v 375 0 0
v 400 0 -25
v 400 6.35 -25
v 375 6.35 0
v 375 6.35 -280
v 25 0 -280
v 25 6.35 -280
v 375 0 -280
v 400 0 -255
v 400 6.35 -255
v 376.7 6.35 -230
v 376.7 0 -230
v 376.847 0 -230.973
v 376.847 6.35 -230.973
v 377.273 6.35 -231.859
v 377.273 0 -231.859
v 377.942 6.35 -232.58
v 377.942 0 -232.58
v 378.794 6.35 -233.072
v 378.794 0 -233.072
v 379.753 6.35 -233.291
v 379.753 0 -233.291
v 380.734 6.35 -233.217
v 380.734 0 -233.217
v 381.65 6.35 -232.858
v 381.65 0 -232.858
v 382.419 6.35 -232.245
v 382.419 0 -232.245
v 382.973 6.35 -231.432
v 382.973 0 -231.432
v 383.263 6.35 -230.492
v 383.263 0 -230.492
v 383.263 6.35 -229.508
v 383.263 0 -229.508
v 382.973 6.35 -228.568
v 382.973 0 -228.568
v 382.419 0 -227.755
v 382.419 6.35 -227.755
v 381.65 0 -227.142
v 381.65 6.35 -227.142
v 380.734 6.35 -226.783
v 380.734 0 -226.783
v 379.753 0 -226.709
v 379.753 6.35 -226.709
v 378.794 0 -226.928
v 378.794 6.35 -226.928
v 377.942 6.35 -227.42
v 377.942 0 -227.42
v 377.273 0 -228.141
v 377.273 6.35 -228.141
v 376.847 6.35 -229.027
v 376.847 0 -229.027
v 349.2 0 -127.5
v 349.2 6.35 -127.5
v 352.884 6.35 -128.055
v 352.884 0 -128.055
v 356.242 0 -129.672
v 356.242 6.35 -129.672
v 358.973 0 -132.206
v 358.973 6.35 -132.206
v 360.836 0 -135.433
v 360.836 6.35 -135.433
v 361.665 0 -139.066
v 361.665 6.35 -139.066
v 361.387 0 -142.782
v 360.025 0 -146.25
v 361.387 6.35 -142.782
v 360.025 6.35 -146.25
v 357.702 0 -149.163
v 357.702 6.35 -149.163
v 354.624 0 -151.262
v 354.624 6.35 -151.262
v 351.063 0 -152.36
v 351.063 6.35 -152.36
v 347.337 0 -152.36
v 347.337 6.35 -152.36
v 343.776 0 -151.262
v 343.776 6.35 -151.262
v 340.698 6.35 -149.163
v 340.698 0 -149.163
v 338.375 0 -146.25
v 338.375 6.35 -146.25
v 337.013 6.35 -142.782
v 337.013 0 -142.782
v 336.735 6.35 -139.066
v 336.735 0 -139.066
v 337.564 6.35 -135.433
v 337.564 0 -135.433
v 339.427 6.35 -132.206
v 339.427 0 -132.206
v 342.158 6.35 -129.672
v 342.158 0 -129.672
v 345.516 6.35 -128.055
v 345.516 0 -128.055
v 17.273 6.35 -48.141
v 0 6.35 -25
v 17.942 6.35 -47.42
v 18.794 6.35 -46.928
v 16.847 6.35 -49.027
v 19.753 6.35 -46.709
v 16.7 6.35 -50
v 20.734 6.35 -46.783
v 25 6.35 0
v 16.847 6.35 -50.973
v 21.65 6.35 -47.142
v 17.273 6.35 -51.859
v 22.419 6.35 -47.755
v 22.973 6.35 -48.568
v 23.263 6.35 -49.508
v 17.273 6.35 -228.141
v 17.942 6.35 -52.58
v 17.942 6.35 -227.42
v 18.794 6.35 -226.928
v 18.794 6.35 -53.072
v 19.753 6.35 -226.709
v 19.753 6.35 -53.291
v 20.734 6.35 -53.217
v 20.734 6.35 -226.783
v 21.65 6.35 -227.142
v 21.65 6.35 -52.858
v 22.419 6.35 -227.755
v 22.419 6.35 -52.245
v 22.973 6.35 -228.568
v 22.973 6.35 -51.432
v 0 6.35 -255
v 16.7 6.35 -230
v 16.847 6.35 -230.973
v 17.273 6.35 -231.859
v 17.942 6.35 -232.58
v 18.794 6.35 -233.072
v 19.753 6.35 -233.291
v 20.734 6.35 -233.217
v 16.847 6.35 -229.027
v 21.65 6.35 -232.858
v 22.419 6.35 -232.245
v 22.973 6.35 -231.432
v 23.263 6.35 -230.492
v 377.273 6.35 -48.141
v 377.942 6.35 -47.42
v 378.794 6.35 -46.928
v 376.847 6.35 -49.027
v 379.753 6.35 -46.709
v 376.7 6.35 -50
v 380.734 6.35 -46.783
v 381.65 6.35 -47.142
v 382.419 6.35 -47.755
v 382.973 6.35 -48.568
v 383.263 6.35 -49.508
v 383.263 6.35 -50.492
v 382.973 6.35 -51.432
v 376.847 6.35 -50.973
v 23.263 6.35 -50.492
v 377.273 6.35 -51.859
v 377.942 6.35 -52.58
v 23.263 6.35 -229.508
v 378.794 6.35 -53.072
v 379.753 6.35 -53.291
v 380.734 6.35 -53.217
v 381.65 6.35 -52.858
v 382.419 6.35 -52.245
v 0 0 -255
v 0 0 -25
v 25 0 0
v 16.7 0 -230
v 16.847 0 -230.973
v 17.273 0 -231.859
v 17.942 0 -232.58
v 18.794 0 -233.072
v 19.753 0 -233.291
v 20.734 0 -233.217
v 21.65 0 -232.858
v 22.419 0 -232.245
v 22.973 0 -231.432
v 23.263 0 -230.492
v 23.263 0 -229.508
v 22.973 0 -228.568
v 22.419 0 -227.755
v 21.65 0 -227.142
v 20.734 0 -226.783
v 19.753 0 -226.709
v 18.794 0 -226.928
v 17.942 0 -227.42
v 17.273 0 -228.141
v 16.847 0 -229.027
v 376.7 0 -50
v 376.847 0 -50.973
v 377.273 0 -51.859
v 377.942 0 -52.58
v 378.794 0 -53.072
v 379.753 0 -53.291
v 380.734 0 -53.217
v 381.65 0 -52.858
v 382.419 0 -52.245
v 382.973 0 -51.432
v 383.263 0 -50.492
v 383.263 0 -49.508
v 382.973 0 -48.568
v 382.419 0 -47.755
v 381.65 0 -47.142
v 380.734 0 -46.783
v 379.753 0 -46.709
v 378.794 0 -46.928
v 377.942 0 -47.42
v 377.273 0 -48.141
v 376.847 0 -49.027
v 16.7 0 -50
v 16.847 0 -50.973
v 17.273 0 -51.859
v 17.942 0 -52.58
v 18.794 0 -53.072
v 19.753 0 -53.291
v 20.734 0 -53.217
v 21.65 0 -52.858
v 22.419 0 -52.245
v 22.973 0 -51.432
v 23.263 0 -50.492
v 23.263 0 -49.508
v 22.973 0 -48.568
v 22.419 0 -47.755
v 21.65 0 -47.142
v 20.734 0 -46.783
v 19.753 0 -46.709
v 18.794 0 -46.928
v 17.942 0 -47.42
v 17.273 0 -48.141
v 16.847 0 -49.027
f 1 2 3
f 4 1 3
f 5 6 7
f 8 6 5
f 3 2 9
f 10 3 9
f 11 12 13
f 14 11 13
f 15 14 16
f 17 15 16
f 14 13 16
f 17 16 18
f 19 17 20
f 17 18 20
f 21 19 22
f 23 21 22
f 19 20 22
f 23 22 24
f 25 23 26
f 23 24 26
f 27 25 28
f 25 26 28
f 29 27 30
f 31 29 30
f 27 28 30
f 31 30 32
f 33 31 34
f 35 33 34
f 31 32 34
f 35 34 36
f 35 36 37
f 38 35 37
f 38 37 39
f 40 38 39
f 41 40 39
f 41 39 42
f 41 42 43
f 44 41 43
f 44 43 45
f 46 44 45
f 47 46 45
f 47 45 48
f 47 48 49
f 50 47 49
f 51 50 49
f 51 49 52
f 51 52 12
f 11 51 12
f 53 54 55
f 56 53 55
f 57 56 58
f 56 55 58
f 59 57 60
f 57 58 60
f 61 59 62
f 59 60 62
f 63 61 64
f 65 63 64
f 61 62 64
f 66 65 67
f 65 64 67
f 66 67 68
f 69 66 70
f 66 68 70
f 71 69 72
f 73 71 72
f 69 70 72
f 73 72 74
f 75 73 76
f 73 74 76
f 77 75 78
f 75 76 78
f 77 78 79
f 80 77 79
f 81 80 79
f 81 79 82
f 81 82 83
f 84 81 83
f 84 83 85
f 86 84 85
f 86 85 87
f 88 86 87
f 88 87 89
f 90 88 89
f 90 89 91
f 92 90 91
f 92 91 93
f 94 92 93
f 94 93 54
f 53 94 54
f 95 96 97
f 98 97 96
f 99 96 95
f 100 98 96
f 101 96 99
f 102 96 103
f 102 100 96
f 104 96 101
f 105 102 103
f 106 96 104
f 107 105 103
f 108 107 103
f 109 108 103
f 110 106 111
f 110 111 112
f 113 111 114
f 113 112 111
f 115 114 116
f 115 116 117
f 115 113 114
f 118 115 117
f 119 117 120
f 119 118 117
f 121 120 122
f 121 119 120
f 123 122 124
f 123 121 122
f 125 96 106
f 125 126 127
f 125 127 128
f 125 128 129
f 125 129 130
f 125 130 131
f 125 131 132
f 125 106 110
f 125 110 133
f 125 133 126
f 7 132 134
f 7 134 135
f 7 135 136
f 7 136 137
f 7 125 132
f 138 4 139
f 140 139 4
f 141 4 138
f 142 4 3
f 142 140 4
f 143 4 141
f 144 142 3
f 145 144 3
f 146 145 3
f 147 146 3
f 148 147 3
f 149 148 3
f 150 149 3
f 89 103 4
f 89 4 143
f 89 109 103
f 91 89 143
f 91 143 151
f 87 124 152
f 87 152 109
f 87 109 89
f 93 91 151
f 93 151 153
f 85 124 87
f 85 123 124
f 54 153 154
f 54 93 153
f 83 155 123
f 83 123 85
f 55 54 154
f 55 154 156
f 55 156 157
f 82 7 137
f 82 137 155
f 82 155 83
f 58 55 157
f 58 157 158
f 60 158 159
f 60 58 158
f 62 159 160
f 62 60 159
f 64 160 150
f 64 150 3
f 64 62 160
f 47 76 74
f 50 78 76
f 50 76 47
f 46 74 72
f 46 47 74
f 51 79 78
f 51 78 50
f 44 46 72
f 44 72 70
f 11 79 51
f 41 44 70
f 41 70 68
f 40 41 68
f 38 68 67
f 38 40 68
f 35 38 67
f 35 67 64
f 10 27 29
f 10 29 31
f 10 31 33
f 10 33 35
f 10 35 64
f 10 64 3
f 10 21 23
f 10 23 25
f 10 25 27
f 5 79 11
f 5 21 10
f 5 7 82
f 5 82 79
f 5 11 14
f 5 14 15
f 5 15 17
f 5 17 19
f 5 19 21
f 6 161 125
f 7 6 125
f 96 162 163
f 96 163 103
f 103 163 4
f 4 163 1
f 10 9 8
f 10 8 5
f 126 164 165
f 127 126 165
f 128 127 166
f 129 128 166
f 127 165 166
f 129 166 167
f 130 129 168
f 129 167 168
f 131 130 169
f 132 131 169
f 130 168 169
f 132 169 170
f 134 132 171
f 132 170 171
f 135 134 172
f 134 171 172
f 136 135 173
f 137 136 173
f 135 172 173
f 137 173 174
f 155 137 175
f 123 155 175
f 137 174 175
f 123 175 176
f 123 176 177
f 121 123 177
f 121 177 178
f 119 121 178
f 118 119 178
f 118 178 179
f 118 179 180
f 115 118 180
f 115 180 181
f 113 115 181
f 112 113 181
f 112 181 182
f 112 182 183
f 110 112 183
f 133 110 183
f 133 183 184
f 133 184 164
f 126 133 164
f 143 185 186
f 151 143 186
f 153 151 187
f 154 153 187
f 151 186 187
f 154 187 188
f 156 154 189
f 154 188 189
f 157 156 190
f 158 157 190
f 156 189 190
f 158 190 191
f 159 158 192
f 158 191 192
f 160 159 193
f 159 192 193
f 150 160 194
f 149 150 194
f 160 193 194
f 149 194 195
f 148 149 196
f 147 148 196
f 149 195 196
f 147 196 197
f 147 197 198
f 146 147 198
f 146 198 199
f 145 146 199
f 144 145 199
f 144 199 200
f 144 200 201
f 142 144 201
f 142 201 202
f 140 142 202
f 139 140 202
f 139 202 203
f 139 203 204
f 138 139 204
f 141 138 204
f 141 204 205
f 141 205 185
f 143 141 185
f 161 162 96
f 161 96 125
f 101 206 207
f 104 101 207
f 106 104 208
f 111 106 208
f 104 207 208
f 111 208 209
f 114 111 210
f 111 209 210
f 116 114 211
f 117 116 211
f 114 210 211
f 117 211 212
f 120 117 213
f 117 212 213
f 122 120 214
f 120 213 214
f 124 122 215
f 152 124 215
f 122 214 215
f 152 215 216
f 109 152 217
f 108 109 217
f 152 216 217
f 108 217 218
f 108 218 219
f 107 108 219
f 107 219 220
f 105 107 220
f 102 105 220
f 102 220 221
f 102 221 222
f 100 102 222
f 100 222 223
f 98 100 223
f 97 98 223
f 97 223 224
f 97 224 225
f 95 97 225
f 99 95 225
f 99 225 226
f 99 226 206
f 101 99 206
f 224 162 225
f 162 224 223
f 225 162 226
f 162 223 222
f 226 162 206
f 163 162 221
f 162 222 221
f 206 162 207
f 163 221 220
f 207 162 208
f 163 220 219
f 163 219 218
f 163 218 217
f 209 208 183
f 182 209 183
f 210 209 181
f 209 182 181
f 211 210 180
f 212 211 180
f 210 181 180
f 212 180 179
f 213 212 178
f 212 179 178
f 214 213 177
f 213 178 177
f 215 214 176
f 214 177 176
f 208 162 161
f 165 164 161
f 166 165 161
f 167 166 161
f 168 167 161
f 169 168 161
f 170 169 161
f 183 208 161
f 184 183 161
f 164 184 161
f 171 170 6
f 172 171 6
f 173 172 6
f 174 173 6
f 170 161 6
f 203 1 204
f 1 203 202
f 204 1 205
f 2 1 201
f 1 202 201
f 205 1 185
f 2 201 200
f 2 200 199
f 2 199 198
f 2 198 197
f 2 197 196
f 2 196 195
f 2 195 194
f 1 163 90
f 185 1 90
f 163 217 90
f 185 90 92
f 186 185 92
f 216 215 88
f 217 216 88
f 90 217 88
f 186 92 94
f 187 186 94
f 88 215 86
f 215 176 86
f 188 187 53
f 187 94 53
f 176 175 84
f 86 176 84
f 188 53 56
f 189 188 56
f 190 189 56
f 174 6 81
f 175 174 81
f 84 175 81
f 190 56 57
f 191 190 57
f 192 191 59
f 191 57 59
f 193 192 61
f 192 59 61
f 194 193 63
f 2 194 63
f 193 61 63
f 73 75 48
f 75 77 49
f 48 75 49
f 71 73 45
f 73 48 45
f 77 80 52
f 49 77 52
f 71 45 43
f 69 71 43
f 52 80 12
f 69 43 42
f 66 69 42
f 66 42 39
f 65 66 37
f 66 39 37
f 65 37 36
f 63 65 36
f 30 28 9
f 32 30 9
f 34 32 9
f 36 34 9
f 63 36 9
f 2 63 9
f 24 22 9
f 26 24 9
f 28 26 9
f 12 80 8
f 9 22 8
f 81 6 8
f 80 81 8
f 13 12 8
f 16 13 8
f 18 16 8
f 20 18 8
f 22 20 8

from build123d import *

# Parameters (mm, degrees)
SKETCH1_W            = 400
SKETCH1_H            = 280
BOSS_EXTRUDE1_DEPTH  = 6.35
CHAMFER1_SIZE        = 25
SKETCH2_R            = 12.5
CUT_EXTRUDE1_DEPTH   = 489.303514732
M6_CLEARANCE_HOLE1_D = 6.6


with BuildPart() as part:
    # Sketch1 → Boss-Extrude1 (new body)
    with BuildSketch(Plane(origin=(0, 0, 0), x_dir=(1, 0, 0), z_dir=(0, 1, 0))):
        with Locations((200, 140)):
            Rectangle(SKETCH1_W, SKETCH1_H)
    extrude(amount=BOSS_EXTRUDE1_DEPTH)

    # Chamfer1
    chamfer1_edges = [part.edges().sort_by_distance(p)[0] for p in [
        (0, 3.175, -280),
        (400, 3.175, -280),
        (400, 3.175, 0),
        (0, 3.175, 0),
    ]]
    chamfer(chamfer1_edges, length=CHAMFER1_SIZE)

    # Sketch2 → Cut-Extrude1 (cut, through all)
    with BuildSketch(Plane(origin=(0, 6.35, 0), x_dir=(1, 0, 0), z_dir=(0, 1, 0))):
        with Locations(Location((349.2, 140, 0), (0, 0, 270))):
            Circle(SKETCH2_R)
    extrude(amount=-CUT_EXTRUDE1_DEPTH, mode=Mode.SUBTRACT)

    # M6 Clearance Hole1 (through all)
    with Locations(Plane(origin=(0, 6.35, 0), x_dir=(1, 0, 0), z_dir=(0, 1, 0))):
        with Locations((380, 230), (380, 50), (20, 50), (20, 230)):
            Hole(M6_CLEARANCE_HOLE1_D / 2)


solid = part.part
